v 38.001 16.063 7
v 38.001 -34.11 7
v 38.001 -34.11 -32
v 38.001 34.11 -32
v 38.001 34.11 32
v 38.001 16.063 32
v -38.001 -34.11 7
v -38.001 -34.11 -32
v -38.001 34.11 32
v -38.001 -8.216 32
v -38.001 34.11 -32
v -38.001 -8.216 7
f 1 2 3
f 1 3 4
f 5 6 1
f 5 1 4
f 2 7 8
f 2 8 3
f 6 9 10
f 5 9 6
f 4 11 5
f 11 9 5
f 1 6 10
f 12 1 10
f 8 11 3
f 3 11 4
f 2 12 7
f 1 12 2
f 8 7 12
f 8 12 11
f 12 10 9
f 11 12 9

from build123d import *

# Parameters (mm, degrees)
F0_W     = 76.00291
F0_H     = 68.219476
F1_DEPTH = 32
F3_DEPTH = 25


with BuildPart() as f1:
    # F0 (on Top) → F1 (new body, symmetric)
    with BuildSketch(Plane.XY):
        Rectangle(F0_W, F0_H)
    extrude(amount=F1_DEPTH, both=True)

    # F2 (on face) → F3 (cut)
    with BuildSketch(Plane.XY.offset(32)):
        Polygon((-38.001455, -34.109738), (38.001455, -34.109738), (38.001455, 16.062718), (-38.001455, -8.216379), align=None)
    extrude(amount=-F3_DEPTH, mode=Mode.SUBTRACT)


solid = f1.part
